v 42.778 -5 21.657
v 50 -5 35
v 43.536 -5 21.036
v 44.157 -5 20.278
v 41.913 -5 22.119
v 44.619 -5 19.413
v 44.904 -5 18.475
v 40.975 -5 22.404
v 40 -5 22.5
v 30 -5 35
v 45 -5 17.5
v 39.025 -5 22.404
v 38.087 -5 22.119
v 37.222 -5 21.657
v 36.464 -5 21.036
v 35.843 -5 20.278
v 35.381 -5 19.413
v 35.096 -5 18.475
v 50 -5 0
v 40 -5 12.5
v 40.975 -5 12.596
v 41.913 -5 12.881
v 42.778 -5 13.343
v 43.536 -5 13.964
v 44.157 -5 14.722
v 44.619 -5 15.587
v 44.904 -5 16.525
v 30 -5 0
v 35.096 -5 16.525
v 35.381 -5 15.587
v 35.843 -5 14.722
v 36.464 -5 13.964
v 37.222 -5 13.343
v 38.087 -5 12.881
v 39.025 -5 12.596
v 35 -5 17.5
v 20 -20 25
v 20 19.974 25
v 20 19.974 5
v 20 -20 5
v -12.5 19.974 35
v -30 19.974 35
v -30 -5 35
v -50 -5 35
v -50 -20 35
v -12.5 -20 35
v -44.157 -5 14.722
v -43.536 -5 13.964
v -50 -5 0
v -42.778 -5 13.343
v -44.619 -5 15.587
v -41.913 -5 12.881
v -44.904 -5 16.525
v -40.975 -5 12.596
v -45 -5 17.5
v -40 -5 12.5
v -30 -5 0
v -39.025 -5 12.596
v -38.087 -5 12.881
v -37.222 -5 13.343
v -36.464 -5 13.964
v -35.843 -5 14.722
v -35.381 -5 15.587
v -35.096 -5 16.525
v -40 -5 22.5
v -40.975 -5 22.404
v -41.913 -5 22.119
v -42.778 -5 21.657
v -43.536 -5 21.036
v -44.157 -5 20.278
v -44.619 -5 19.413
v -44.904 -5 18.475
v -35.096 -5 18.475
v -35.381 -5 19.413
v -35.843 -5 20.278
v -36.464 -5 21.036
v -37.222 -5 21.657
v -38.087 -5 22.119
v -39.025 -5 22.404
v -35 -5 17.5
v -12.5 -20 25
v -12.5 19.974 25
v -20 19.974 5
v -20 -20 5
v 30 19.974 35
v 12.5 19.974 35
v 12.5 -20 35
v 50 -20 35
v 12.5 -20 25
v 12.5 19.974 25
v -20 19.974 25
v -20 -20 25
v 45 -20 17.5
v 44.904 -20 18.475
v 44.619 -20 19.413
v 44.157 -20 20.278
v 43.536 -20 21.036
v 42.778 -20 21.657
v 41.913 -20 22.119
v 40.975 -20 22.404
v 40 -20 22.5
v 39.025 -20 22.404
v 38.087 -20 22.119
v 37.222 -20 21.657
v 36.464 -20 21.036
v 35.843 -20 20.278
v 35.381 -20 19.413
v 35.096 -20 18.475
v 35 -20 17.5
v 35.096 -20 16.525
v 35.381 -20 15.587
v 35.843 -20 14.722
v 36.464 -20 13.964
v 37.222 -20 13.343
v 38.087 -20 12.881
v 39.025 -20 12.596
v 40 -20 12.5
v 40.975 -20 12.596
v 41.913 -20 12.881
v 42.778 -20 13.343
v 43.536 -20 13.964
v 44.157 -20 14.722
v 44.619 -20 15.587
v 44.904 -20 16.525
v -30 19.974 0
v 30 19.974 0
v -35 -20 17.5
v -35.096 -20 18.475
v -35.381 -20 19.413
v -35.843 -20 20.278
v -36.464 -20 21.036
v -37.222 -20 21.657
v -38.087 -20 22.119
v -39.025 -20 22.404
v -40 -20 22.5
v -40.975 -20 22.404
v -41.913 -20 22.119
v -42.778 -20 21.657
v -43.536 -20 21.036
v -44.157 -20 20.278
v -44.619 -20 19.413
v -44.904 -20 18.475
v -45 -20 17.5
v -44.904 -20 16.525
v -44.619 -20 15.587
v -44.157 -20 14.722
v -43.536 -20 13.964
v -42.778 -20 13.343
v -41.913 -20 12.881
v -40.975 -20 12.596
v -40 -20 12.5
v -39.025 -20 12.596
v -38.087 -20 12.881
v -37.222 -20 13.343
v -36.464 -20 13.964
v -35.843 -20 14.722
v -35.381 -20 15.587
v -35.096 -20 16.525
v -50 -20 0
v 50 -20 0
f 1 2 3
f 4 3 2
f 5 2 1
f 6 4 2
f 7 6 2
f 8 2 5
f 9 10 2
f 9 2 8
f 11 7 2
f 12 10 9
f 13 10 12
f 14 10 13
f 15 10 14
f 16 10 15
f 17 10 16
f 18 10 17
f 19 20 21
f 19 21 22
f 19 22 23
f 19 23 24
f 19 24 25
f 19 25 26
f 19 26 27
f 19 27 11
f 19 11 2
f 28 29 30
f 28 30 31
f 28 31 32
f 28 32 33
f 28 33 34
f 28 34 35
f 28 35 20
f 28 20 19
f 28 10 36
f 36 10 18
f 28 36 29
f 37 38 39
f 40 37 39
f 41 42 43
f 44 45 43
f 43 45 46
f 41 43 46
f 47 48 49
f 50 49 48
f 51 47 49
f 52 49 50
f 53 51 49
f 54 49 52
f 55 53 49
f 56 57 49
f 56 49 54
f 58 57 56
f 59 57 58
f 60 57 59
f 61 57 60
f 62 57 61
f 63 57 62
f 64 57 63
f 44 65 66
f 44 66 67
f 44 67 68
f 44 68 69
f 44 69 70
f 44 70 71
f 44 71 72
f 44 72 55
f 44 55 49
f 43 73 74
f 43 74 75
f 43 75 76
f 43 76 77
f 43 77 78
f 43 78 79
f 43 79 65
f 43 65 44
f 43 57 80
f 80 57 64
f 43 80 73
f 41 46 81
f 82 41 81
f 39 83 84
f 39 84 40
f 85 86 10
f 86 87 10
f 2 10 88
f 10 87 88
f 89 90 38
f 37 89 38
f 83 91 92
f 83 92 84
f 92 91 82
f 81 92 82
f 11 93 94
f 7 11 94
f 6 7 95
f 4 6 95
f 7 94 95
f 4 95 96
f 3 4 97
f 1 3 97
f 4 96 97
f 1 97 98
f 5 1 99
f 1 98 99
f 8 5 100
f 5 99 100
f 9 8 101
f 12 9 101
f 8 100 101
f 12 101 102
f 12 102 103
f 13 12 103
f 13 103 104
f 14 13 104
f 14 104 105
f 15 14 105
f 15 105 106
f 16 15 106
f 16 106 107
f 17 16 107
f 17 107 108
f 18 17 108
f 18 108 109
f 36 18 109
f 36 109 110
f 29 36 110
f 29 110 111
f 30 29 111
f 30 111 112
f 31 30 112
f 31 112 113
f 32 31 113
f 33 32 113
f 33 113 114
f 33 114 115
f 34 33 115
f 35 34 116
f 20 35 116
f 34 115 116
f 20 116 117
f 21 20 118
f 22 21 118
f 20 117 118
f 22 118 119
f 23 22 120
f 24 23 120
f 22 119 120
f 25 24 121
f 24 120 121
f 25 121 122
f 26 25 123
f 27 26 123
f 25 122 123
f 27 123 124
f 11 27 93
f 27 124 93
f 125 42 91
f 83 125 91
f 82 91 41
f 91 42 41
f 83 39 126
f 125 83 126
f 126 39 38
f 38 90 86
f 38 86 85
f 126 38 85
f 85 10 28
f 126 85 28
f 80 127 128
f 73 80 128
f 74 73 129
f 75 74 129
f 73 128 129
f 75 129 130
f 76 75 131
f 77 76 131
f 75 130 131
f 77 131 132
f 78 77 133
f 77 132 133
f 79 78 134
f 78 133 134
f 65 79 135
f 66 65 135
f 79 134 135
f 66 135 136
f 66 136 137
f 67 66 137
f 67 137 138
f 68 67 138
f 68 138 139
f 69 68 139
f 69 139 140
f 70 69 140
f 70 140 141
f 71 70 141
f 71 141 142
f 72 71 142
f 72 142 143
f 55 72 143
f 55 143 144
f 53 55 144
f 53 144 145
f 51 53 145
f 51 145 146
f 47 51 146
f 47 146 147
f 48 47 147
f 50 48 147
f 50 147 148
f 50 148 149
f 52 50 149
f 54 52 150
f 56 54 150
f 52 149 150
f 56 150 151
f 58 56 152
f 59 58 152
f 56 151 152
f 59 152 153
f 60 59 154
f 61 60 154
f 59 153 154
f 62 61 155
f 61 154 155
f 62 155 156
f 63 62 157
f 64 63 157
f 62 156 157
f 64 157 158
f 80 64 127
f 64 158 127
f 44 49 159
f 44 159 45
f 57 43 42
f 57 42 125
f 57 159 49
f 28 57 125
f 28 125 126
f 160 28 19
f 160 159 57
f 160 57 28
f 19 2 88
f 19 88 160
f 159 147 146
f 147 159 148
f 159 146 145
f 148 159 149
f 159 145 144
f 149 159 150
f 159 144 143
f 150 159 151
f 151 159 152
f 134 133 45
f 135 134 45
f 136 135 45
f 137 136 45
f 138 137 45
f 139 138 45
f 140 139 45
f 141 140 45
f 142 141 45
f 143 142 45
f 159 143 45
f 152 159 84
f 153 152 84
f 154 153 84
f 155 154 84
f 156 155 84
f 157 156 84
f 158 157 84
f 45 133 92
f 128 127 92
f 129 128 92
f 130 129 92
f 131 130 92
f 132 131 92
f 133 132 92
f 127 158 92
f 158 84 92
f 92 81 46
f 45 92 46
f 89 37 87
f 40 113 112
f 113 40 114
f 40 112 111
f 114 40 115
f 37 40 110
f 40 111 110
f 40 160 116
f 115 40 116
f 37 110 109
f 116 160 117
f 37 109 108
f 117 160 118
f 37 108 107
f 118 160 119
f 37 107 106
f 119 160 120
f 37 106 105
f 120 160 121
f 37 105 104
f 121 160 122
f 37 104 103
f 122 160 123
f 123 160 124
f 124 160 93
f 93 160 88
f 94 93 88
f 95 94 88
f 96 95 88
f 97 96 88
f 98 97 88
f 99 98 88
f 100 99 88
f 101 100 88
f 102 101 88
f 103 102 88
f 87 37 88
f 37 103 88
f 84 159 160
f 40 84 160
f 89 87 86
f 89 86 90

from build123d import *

# Parameters (mm, degrees)
ESBO_O1_W                = 60
ESBO_O1_H                = 40
RESSALTO_EXTRUS_O1_DEPTH = 35
ESBO_O3_W                = 40
ESBO_O3_H                = 20
CORTE_EXTRUS_O2_DEPTH    = 80
ESBO_O4_W                = 25
ESBO_O4_H                = 10
CORTE_EXTRUS_O3_DEPTH    = 80
ESBO_O5_W                = 35
ESBO_O5_H                = 15
RESSALTO_EXTRUS_O2_DEPTH = 20
ESBO_O6_W                = 35
ESBO_O6_H                = 15
RESSALTO_EXTRUS_O3_DEPTH = 20
ESBO_O7_W                = 60
ESBO_O7_H                = 35
RESSALTO_EXTRUS_O4_DEPTH = 10
ESBO_O8_R                = 5
CORTE_EXTRUS_O4_DEPTH    = 51
ESBO_O9_W                = 60
ESBO_O9_H                = 10.026146623
CORTE_EXTRUS_O5_DEPTH    = 36


with BuildPart() as part:
    # Esboço1 → Ressalto-extrusão1 (new body)
    with BuildSketch(Plane.XY):
        Rectangle(ESBO_O1_W, ESBO_O1_H)
    extrude(amount=RESSALTO_EXTRUS_O1_DEPTH)

    # Esboço3 → Corte-extrusão2 (cut)
    with BuildSketch(Plane(origin=(0, 20, 0), x_dir=(1, 0, 0), z_dir=(0, 1, 0))):
        with Locations((0, -15)):
            Rectangle(ESBO_O3_W, ESBO_O3_H)
    extrude(amount=-CORTE_EXTRUS_O2_DEPTH, mode=Mode.SUBTRACT)

    # Esboço4 → Corte-extrusão3 (cut)
    with BuildSketch(Plane(origin=(0, 20, 0), x_dir=(1, 0, 0), z_dir=(0, 1, 0))):
        with Locations((0, -30)):
            Rectangle(ESBO_O4_W, ESBO_O4_H)
    extrude(amount=-CORTE_EXTRUS_O3_DEPTH, mode=Mode.SUBTRACT)

    # Esboço5 → Ressalto-extrusão2 (add)
    with BuildSketch(Plane(origin=(30, 0, 0), x_dir=(0, 0, -1), z_dir=(1, 0, 0))):
        with Locations((-17.5, -12.5)):
            Rectangle(ESBO_O5_W, ESBO_O5_H)
    extrude(amount=RESSALTO_EXTRUS_O2_DEPTH)

    # Esboço6 → Ressalto-extrusão3 (add)
    with BuildSketch(Plane.ZY.offset(30)):
        with Locations((17.5, -12.5)):
            Rectangle(ESBO_O6_W, ESBO_O6_H)
    extrude(amount=RESSALTO_EXTRUS_O3_DEPTH)

    # Esboço7 → Ressalto-extrusão4 (add)
    with BuildSketch(Plane(origin=(0, 20, 0), x_dir=(1, 0, 0), z_dir=(0, 1, 0))):
        with Locations((0, -17.5)):
            Rectangle(ESBO_O7_W, ESBO_O7_H)
    extrude(amount=RESSALTO_EXTRUS_O4_DEPTH)

    # Esboço8 → Corte-extrusão4 (cut, through all)
    with BuildSketch(Plane.XZ.offset(20)):
        with Locations((40, 17.5)):
            Circle(ESBO_O8_R)
        with Locations((-40, 17.5)):
            Circle(ESBO_O8_R)
    extrude(amount=-CORTE_EXTRUS_O4_DEPTH, mode=Mode.SUBTRACT)

    # Esboço9 → Corte-extrusão5 (cut, through all)
    with BuildSketch(Plane.XY.offset(35)):
        with Locations((0, 24.986926689)):
            Rectangle(ESBO_O9_W, ESBO_O9_H)
    extrude(amount=-CORTE_EXTRUS_O5_DEPTH, mode=Mode.SUBTRACT)


solid = part.part
